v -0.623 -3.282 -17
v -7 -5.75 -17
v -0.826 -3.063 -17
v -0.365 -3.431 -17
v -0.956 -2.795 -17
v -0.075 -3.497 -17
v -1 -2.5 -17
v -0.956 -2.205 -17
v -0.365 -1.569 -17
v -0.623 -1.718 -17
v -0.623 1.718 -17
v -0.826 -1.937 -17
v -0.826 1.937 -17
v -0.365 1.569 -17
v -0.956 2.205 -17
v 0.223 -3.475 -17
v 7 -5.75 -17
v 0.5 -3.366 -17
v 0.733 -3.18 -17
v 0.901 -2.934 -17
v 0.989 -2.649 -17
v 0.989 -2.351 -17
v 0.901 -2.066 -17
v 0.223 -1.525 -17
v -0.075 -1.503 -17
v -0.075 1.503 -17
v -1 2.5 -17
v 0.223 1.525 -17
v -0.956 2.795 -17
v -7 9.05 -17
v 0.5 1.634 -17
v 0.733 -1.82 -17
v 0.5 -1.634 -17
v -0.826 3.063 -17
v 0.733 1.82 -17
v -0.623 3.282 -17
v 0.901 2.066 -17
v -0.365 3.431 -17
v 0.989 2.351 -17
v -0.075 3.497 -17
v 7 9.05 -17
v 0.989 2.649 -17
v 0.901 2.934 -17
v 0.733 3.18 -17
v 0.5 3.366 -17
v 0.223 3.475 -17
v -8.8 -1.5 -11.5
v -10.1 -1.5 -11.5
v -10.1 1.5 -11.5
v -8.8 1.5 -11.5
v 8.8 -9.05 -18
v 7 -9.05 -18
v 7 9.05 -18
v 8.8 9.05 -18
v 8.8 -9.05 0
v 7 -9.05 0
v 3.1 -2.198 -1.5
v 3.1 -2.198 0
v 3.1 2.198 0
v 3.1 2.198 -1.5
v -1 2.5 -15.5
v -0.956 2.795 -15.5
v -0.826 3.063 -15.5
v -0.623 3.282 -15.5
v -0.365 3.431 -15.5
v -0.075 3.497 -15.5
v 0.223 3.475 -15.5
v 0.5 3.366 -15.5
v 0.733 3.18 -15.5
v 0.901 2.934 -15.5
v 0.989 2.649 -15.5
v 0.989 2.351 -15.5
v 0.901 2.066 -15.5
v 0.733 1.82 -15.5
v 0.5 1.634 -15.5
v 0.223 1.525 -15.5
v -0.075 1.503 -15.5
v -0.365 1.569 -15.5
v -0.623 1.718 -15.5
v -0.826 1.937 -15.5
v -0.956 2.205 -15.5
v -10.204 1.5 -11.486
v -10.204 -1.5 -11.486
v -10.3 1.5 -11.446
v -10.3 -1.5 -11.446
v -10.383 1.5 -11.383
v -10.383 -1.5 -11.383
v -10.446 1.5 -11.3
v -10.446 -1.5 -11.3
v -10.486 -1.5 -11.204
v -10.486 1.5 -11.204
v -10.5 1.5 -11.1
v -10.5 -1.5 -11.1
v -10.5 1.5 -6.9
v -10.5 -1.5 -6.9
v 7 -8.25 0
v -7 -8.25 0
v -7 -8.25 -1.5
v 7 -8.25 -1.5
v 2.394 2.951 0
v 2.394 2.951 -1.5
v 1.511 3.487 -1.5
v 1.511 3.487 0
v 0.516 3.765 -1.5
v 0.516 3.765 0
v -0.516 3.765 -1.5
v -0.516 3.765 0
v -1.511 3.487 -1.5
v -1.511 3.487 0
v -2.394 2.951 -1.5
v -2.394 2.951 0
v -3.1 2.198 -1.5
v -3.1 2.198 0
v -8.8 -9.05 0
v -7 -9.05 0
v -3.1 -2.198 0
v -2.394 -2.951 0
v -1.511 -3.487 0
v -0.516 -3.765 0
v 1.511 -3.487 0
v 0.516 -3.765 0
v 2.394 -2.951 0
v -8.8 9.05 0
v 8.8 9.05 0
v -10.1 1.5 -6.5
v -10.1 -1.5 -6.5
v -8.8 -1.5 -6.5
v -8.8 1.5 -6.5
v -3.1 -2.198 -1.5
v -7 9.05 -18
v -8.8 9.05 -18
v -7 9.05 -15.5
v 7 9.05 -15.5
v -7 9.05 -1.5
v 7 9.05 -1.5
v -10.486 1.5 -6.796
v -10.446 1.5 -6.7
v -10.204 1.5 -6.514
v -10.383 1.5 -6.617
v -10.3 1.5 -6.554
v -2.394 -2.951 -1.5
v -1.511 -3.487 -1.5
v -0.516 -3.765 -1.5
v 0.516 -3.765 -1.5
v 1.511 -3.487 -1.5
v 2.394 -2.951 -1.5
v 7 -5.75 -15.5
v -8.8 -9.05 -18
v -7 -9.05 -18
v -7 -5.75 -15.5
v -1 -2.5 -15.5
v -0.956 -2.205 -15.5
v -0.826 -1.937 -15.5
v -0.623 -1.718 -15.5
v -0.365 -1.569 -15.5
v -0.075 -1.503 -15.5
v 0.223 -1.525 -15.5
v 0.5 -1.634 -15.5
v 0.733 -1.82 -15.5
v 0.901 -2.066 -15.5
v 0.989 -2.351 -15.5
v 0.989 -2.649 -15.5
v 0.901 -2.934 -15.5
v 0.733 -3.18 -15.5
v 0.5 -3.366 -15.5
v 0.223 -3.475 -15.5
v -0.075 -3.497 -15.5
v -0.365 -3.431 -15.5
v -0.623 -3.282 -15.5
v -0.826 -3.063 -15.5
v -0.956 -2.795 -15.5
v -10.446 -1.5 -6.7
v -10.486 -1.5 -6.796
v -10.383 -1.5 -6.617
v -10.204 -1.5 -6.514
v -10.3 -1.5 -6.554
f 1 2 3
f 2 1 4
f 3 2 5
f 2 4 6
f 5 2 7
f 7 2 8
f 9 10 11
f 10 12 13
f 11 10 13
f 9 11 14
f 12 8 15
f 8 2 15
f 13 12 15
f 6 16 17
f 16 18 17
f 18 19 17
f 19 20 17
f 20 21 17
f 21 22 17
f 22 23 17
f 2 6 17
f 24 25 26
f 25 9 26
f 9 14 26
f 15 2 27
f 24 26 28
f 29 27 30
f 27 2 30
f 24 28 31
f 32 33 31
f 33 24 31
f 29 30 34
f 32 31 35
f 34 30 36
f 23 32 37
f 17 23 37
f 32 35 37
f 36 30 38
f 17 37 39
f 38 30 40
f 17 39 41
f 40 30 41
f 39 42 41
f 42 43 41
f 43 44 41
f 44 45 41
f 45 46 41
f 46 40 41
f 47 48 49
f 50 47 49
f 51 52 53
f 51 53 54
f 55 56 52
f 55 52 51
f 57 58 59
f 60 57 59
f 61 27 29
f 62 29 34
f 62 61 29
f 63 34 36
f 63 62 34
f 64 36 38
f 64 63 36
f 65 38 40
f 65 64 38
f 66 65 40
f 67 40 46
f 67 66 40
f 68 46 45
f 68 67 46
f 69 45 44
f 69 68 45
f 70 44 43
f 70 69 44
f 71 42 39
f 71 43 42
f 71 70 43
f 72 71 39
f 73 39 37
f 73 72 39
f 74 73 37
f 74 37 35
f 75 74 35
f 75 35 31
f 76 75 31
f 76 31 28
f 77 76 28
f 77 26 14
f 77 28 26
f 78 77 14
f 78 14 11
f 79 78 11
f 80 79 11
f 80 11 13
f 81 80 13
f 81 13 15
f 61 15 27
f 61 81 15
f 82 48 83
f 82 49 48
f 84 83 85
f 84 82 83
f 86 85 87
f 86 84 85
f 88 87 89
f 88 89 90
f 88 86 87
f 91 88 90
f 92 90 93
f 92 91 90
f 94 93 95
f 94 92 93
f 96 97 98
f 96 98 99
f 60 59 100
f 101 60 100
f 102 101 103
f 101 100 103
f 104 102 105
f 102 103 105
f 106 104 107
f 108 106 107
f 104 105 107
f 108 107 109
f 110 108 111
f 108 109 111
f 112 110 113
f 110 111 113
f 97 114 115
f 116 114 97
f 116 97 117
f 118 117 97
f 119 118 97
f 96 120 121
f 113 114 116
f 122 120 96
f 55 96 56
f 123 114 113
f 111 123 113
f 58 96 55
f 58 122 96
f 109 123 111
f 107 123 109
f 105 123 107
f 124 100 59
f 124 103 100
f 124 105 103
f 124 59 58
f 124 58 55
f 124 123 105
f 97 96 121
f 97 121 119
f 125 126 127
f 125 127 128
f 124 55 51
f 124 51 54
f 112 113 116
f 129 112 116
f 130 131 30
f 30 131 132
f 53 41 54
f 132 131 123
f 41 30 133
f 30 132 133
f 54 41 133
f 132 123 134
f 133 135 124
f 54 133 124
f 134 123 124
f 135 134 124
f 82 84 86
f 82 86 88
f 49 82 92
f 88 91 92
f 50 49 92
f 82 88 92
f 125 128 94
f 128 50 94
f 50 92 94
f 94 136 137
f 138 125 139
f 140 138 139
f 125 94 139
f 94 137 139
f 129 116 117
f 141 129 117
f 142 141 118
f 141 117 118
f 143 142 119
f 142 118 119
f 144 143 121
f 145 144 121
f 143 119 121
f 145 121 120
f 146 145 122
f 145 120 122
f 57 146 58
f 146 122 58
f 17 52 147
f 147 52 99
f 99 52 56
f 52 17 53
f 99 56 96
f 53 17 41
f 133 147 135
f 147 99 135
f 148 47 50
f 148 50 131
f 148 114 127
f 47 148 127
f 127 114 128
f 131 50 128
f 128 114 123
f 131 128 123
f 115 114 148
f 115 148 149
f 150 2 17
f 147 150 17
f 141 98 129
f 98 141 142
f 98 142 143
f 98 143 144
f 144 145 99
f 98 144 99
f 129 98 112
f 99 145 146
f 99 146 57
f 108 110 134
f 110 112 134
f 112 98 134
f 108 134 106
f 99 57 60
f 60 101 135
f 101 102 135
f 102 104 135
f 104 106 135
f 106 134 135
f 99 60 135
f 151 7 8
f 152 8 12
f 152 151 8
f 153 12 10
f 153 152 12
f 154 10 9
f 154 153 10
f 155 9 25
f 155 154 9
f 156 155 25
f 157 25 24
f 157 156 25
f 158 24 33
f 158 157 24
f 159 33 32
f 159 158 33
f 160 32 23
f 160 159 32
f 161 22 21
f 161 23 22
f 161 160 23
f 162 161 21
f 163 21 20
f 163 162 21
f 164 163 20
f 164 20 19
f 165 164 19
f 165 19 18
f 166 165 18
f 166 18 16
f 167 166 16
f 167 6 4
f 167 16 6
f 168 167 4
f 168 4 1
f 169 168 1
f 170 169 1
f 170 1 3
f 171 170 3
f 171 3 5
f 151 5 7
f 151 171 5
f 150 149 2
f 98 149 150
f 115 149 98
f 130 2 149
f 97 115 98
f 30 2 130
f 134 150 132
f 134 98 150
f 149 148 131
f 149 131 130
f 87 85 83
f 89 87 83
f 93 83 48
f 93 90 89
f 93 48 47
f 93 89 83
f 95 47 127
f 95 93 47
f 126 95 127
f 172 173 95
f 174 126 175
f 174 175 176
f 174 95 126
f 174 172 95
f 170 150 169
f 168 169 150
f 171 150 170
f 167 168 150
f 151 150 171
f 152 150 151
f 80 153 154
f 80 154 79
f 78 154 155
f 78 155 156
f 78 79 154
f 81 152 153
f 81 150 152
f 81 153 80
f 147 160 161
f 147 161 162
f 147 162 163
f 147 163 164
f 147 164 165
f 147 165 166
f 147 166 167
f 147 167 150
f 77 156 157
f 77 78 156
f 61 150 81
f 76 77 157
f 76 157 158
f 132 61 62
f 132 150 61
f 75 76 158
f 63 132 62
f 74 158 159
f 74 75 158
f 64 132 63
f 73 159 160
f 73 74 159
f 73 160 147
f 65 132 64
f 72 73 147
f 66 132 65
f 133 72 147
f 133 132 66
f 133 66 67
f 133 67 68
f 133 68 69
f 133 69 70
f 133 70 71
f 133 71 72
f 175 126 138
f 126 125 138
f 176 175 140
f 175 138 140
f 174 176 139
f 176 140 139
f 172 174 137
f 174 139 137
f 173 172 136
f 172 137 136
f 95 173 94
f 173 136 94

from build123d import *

# Parameters (mm, degrees)
SKETCH_1_W                  = 18
SKETCH_1_H                  = 18.5
EXTRUDE_1_DEPTH             = 1.5
SKETCH_2_W                  = 2
SKETCH_2_H                  = 18.5
EXTRUDE_2_DEPTH             = 18
SKETCH_5_W                  = 18
SKETCH_5_H                  = 1.5
EXTRUDE_5_DEPTH             = 15
SKETCH_6_R                  = 1
CUT_EXTRUDE_1_DEPTH         = 21.169593452
SKETCH_7_W                  = 14
SKETCH_7_H                  = 1.5
CUT_EXTRUDE_2_DEPTH         = 1
SKETCH_8_W                  = 27.6
SKETCH_8_H                  = 28.1
SKETCH_8_W_2                = 17.6
SKETCH_8_H_2                = 18.1
CUT_EXTRUDE_3_DEPTH         = 23.148645557
SKETCH_4_W                  = 5
SKETCH_4_H                  = 3
EXTRUDE_4_DEPTH             = 1.5
EXTRUDE_4_DIRECTION_2_REACH = 28.884
FILLET_1_R                  = 0.4


with BuildPart() as part:
    # Эскиз1 → Бобышка-Вытянуть1 (new body)
    with BuildSketch(Plane.XY):
        Rectangle(SKETCH_1_W, SKETCH_1_H)
        with BuildLine():
            Line((3.1, -2.197726098), (3.1, 2.197726098))
            ThreePointArc((3.1, 2.197726098), (0, 3.8), (-3.1, 2.197726098))
            Line((-3.1, 2.197726098), (-3.1, -2.197726098))
            ThreePointArc((-3.1, -2.197726098), (0, -3.8), (3.1, -2.197726098))
        make_face(mode=Mode.SUBTRACT)
    extrude(amount=-EXTRUDE_1_DEPTH)

    # Эскиз2 → Бобышка-Вытянуть2 (add)
    with BuildSketch(Plane.XY):
        with Locations((-8, 0)):
            Rectangle(SKETCH_2_W, SKETCH_2_H)
        with Locations((8, 0)):
            Rectangle(SKETCH_2_W, SKETCH_2_H)
    extrude(amount=-EXTRUDE_2_DEPTH)

    # Эскиз5 → Бобышка-Вытянуть5 (add)
    with BuildSketch(Plane(origin=(0, 9.25, 0), x_dir=(1, 0, 0), z_dir=(0, 1, 0))):
        with Locations((0, 16.25)):
            Rectangle(SKETCH_5_W, SKETCH_5_H)
    extrude(amount=-EXTRUDE_5_DEPTH)

    # Эскиз6 → Вырез-Вытянуть1 (cut, through all)
    with BuildSketch(Plane(origin=(0, 0, -15.5), x_dir=(-1, 0, 0), z_dir=(0, 0, -1))):
        with Locations((0, 2.5)):
            Circle(SKETCH_6_R)
        with Locations((0, -2.5)):
            Circle(SKETCH_6_R)
    extrude(amount=CUT_EXTRUDE_1_DEPTH, mode=Mode.SUBTRACT)

    # Эскиз7 → Вырез-Вытянуть2 (cut)
    with BuildSketch(Plane.XZ.offset(9.25)):
        with Locations((0, -0.75)):
            Rectangle(SKETCH_7_W, SKETCH_7_H)
    extrude(amount=-CUT_EXTRUDE_2_DEPTH, mode=Mode.SUBTRACT)

    # Эскиз8 → Вырез-Вытянуть3 (cut, through all)
    with BuildSketch(Plane.XY):
        Rectangle(SKETCH_8_W, SKETCH_8_H)
        Rectangle(SKETCH_8_W_2, SKETCH_8_H_2, mode=Mode.SUBTRACT)
    extrude(amount=-CUT_EXTRUDE_3_DEPTH, mode=Mode.SUBTRACT)

    # Эскиз4 → Бобышка-Вытянуть4 (add)
    with BuildSketch(Plane.ZY.offset(9)):
        with Locations((-9, 0)):
            Rectangle(SKETCH_4_W, SKETCH_4_H)
    extrude(amount=EXTRUDE_4_DEPTH)

    # Эскиз4 → Бобышка-Вытянуть4 direction 2 (add, up to next)
    with BuildSketch(Plane.ZY.offset(9), mode=Mode.PRIVATE) as extrude_4_direction_2_sk1:
        with Locations((-9, 0)):
            Rectangle(SKETCH_4_W, SKETCH_4_H)
    extrude_4_direction_2_tool1 = extrude(extrude_4_direction_2_sk1.sketch, amount=-EXTRUDE_4_DIRECTION_2_REACH, mode=Mode.PRIVATE) - part.part
    add(extrude_4_direction_2_tool1.solids().sort_by_distance((-9, 0, -9))[0])

    # Скругление1
    fillet_1_edges = [part.edges().sort_by_distance(p)[0] for p in [
        (-10.5, 0, -11.5),
        (-10.5, 0, -6.5),
    ]]
    fillet(fillet_1_edges, radius=FILLET_1_R)


solid = part.part
